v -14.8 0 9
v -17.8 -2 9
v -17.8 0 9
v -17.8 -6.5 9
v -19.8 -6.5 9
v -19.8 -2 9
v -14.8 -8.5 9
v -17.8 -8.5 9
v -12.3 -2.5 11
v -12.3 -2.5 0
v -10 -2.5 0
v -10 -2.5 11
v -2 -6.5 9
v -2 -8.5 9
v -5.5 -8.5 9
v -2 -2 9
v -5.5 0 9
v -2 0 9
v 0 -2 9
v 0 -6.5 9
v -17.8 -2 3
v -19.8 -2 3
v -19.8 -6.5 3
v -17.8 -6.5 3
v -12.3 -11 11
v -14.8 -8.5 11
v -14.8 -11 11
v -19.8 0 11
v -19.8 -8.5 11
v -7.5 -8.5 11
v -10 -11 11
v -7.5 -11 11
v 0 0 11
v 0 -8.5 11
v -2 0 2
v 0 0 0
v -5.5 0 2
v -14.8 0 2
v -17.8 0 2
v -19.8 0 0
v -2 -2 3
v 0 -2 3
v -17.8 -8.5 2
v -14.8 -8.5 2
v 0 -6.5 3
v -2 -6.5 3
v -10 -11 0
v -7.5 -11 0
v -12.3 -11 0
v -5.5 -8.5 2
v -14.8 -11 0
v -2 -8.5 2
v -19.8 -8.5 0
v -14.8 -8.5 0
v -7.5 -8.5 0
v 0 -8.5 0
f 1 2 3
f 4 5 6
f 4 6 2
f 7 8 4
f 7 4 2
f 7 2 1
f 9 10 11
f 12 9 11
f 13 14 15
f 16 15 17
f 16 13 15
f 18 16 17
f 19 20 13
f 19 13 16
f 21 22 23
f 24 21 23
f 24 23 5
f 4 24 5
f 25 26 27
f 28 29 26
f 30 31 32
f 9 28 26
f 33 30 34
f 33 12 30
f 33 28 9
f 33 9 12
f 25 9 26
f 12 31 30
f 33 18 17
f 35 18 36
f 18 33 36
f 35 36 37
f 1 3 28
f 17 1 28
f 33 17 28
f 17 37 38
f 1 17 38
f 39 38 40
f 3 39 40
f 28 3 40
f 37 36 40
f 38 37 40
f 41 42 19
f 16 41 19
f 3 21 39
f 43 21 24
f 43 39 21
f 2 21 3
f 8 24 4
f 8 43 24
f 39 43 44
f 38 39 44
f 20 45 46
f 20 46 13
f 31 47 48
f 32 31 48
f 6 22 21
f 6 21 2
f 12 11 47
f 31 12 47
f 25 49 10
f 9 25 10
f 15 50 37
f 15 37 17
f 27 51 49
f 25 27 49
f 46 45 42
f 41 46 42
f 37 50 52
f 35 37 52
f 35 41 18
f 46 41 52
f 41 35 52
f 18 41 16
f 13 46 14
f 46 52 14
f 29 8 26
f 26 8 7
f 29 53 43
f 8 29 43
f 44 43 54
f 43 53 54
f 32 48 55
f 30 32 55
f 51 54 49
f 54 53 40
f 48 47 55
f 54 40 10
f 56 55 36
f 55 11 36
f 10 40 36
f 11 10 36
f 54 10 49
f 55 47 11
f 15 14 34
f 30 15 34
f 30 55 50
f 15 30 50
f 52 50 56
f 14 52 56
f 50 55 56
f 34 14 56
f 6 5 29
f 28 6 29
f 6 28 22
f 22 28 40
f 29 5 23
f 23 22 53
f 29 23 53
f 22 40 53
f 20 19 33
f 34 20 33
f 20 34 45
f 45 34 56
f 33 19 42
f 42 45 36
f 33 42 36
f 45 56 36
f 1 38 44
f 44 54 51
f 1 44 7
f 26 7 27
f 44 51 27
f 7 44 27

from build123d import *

# Parameters (mm, degrees)
F1_DEPTH = 11
F2_W     = 4.5
F2_H     = 6
F3_DEPTH = 5
F4_W     = 3
F4_H     = 7
F5_DEPTH = 8.501
F6_W     = 4.5
F6_H     = 6
F7_DEPTH = 5
F8_W     = 3.5
F8_H     = 7
F9_DEPTH = 8.501


with BuildPart() as f1:
    # F0 (on Top) → F1 (new body)
    with BuildSketch(Plane.XY):
        Polygon((0, -8.5), (0, 0), (-19.8, 0), (-19.8, -8.5), (-14.8, -8.5), (-14.8, -11), (-12.3, -11), (-12.3, -2.5), (-10, -2.5), (-10, -11), (-7.5, -11), (-7.5, -8.5), align=None)
    extrude(amount=F1_DEPTH)

    # F2 (on face) → F3 (cut, through all)
    with BuildSketch(Plane(origin=(-19.8, 0, 0), x_dir=(0, -1, 0), z_dir=(-1, 0, 0))):
        with Locations((4.25, 6)):
            Rectangle(F2_W, F2_H)
    extrude(amount=-F3_DEPTH, mode=Mode.SUBTRACT)

    # F4 (on face) → F5 (cut, through all)
    with BuildSketch(Plane.XZ.offset(8.5)):
        with Locations((-16.3, 5.5)):
            Rectangle(F4_W, F4_H)
    extrude(amount=-F5_DEPTH, mode=Mode.SUBTRACT)

    # F6 (on face) → F7 (cut)
    with BuildSketch(Plane.YZ):
        with Locations((-4.25, 6)):
            Rectangle(F6_W, F6_H)
    extrude(amount=-F7_DEPTH, mode=Mode.SUBTRACT)

    # F8 (on face) → F9 (cut, through all)
    with BuildSketch(Plane.XZ.offset(8.5)):
        with Locations((-3.75, 5.5)):
            Rectangle(F8_W, F8_H)
    extrude(amount=-F9_DEPTH, mode=Mode.SUBTRACT)


solid = f1.part
